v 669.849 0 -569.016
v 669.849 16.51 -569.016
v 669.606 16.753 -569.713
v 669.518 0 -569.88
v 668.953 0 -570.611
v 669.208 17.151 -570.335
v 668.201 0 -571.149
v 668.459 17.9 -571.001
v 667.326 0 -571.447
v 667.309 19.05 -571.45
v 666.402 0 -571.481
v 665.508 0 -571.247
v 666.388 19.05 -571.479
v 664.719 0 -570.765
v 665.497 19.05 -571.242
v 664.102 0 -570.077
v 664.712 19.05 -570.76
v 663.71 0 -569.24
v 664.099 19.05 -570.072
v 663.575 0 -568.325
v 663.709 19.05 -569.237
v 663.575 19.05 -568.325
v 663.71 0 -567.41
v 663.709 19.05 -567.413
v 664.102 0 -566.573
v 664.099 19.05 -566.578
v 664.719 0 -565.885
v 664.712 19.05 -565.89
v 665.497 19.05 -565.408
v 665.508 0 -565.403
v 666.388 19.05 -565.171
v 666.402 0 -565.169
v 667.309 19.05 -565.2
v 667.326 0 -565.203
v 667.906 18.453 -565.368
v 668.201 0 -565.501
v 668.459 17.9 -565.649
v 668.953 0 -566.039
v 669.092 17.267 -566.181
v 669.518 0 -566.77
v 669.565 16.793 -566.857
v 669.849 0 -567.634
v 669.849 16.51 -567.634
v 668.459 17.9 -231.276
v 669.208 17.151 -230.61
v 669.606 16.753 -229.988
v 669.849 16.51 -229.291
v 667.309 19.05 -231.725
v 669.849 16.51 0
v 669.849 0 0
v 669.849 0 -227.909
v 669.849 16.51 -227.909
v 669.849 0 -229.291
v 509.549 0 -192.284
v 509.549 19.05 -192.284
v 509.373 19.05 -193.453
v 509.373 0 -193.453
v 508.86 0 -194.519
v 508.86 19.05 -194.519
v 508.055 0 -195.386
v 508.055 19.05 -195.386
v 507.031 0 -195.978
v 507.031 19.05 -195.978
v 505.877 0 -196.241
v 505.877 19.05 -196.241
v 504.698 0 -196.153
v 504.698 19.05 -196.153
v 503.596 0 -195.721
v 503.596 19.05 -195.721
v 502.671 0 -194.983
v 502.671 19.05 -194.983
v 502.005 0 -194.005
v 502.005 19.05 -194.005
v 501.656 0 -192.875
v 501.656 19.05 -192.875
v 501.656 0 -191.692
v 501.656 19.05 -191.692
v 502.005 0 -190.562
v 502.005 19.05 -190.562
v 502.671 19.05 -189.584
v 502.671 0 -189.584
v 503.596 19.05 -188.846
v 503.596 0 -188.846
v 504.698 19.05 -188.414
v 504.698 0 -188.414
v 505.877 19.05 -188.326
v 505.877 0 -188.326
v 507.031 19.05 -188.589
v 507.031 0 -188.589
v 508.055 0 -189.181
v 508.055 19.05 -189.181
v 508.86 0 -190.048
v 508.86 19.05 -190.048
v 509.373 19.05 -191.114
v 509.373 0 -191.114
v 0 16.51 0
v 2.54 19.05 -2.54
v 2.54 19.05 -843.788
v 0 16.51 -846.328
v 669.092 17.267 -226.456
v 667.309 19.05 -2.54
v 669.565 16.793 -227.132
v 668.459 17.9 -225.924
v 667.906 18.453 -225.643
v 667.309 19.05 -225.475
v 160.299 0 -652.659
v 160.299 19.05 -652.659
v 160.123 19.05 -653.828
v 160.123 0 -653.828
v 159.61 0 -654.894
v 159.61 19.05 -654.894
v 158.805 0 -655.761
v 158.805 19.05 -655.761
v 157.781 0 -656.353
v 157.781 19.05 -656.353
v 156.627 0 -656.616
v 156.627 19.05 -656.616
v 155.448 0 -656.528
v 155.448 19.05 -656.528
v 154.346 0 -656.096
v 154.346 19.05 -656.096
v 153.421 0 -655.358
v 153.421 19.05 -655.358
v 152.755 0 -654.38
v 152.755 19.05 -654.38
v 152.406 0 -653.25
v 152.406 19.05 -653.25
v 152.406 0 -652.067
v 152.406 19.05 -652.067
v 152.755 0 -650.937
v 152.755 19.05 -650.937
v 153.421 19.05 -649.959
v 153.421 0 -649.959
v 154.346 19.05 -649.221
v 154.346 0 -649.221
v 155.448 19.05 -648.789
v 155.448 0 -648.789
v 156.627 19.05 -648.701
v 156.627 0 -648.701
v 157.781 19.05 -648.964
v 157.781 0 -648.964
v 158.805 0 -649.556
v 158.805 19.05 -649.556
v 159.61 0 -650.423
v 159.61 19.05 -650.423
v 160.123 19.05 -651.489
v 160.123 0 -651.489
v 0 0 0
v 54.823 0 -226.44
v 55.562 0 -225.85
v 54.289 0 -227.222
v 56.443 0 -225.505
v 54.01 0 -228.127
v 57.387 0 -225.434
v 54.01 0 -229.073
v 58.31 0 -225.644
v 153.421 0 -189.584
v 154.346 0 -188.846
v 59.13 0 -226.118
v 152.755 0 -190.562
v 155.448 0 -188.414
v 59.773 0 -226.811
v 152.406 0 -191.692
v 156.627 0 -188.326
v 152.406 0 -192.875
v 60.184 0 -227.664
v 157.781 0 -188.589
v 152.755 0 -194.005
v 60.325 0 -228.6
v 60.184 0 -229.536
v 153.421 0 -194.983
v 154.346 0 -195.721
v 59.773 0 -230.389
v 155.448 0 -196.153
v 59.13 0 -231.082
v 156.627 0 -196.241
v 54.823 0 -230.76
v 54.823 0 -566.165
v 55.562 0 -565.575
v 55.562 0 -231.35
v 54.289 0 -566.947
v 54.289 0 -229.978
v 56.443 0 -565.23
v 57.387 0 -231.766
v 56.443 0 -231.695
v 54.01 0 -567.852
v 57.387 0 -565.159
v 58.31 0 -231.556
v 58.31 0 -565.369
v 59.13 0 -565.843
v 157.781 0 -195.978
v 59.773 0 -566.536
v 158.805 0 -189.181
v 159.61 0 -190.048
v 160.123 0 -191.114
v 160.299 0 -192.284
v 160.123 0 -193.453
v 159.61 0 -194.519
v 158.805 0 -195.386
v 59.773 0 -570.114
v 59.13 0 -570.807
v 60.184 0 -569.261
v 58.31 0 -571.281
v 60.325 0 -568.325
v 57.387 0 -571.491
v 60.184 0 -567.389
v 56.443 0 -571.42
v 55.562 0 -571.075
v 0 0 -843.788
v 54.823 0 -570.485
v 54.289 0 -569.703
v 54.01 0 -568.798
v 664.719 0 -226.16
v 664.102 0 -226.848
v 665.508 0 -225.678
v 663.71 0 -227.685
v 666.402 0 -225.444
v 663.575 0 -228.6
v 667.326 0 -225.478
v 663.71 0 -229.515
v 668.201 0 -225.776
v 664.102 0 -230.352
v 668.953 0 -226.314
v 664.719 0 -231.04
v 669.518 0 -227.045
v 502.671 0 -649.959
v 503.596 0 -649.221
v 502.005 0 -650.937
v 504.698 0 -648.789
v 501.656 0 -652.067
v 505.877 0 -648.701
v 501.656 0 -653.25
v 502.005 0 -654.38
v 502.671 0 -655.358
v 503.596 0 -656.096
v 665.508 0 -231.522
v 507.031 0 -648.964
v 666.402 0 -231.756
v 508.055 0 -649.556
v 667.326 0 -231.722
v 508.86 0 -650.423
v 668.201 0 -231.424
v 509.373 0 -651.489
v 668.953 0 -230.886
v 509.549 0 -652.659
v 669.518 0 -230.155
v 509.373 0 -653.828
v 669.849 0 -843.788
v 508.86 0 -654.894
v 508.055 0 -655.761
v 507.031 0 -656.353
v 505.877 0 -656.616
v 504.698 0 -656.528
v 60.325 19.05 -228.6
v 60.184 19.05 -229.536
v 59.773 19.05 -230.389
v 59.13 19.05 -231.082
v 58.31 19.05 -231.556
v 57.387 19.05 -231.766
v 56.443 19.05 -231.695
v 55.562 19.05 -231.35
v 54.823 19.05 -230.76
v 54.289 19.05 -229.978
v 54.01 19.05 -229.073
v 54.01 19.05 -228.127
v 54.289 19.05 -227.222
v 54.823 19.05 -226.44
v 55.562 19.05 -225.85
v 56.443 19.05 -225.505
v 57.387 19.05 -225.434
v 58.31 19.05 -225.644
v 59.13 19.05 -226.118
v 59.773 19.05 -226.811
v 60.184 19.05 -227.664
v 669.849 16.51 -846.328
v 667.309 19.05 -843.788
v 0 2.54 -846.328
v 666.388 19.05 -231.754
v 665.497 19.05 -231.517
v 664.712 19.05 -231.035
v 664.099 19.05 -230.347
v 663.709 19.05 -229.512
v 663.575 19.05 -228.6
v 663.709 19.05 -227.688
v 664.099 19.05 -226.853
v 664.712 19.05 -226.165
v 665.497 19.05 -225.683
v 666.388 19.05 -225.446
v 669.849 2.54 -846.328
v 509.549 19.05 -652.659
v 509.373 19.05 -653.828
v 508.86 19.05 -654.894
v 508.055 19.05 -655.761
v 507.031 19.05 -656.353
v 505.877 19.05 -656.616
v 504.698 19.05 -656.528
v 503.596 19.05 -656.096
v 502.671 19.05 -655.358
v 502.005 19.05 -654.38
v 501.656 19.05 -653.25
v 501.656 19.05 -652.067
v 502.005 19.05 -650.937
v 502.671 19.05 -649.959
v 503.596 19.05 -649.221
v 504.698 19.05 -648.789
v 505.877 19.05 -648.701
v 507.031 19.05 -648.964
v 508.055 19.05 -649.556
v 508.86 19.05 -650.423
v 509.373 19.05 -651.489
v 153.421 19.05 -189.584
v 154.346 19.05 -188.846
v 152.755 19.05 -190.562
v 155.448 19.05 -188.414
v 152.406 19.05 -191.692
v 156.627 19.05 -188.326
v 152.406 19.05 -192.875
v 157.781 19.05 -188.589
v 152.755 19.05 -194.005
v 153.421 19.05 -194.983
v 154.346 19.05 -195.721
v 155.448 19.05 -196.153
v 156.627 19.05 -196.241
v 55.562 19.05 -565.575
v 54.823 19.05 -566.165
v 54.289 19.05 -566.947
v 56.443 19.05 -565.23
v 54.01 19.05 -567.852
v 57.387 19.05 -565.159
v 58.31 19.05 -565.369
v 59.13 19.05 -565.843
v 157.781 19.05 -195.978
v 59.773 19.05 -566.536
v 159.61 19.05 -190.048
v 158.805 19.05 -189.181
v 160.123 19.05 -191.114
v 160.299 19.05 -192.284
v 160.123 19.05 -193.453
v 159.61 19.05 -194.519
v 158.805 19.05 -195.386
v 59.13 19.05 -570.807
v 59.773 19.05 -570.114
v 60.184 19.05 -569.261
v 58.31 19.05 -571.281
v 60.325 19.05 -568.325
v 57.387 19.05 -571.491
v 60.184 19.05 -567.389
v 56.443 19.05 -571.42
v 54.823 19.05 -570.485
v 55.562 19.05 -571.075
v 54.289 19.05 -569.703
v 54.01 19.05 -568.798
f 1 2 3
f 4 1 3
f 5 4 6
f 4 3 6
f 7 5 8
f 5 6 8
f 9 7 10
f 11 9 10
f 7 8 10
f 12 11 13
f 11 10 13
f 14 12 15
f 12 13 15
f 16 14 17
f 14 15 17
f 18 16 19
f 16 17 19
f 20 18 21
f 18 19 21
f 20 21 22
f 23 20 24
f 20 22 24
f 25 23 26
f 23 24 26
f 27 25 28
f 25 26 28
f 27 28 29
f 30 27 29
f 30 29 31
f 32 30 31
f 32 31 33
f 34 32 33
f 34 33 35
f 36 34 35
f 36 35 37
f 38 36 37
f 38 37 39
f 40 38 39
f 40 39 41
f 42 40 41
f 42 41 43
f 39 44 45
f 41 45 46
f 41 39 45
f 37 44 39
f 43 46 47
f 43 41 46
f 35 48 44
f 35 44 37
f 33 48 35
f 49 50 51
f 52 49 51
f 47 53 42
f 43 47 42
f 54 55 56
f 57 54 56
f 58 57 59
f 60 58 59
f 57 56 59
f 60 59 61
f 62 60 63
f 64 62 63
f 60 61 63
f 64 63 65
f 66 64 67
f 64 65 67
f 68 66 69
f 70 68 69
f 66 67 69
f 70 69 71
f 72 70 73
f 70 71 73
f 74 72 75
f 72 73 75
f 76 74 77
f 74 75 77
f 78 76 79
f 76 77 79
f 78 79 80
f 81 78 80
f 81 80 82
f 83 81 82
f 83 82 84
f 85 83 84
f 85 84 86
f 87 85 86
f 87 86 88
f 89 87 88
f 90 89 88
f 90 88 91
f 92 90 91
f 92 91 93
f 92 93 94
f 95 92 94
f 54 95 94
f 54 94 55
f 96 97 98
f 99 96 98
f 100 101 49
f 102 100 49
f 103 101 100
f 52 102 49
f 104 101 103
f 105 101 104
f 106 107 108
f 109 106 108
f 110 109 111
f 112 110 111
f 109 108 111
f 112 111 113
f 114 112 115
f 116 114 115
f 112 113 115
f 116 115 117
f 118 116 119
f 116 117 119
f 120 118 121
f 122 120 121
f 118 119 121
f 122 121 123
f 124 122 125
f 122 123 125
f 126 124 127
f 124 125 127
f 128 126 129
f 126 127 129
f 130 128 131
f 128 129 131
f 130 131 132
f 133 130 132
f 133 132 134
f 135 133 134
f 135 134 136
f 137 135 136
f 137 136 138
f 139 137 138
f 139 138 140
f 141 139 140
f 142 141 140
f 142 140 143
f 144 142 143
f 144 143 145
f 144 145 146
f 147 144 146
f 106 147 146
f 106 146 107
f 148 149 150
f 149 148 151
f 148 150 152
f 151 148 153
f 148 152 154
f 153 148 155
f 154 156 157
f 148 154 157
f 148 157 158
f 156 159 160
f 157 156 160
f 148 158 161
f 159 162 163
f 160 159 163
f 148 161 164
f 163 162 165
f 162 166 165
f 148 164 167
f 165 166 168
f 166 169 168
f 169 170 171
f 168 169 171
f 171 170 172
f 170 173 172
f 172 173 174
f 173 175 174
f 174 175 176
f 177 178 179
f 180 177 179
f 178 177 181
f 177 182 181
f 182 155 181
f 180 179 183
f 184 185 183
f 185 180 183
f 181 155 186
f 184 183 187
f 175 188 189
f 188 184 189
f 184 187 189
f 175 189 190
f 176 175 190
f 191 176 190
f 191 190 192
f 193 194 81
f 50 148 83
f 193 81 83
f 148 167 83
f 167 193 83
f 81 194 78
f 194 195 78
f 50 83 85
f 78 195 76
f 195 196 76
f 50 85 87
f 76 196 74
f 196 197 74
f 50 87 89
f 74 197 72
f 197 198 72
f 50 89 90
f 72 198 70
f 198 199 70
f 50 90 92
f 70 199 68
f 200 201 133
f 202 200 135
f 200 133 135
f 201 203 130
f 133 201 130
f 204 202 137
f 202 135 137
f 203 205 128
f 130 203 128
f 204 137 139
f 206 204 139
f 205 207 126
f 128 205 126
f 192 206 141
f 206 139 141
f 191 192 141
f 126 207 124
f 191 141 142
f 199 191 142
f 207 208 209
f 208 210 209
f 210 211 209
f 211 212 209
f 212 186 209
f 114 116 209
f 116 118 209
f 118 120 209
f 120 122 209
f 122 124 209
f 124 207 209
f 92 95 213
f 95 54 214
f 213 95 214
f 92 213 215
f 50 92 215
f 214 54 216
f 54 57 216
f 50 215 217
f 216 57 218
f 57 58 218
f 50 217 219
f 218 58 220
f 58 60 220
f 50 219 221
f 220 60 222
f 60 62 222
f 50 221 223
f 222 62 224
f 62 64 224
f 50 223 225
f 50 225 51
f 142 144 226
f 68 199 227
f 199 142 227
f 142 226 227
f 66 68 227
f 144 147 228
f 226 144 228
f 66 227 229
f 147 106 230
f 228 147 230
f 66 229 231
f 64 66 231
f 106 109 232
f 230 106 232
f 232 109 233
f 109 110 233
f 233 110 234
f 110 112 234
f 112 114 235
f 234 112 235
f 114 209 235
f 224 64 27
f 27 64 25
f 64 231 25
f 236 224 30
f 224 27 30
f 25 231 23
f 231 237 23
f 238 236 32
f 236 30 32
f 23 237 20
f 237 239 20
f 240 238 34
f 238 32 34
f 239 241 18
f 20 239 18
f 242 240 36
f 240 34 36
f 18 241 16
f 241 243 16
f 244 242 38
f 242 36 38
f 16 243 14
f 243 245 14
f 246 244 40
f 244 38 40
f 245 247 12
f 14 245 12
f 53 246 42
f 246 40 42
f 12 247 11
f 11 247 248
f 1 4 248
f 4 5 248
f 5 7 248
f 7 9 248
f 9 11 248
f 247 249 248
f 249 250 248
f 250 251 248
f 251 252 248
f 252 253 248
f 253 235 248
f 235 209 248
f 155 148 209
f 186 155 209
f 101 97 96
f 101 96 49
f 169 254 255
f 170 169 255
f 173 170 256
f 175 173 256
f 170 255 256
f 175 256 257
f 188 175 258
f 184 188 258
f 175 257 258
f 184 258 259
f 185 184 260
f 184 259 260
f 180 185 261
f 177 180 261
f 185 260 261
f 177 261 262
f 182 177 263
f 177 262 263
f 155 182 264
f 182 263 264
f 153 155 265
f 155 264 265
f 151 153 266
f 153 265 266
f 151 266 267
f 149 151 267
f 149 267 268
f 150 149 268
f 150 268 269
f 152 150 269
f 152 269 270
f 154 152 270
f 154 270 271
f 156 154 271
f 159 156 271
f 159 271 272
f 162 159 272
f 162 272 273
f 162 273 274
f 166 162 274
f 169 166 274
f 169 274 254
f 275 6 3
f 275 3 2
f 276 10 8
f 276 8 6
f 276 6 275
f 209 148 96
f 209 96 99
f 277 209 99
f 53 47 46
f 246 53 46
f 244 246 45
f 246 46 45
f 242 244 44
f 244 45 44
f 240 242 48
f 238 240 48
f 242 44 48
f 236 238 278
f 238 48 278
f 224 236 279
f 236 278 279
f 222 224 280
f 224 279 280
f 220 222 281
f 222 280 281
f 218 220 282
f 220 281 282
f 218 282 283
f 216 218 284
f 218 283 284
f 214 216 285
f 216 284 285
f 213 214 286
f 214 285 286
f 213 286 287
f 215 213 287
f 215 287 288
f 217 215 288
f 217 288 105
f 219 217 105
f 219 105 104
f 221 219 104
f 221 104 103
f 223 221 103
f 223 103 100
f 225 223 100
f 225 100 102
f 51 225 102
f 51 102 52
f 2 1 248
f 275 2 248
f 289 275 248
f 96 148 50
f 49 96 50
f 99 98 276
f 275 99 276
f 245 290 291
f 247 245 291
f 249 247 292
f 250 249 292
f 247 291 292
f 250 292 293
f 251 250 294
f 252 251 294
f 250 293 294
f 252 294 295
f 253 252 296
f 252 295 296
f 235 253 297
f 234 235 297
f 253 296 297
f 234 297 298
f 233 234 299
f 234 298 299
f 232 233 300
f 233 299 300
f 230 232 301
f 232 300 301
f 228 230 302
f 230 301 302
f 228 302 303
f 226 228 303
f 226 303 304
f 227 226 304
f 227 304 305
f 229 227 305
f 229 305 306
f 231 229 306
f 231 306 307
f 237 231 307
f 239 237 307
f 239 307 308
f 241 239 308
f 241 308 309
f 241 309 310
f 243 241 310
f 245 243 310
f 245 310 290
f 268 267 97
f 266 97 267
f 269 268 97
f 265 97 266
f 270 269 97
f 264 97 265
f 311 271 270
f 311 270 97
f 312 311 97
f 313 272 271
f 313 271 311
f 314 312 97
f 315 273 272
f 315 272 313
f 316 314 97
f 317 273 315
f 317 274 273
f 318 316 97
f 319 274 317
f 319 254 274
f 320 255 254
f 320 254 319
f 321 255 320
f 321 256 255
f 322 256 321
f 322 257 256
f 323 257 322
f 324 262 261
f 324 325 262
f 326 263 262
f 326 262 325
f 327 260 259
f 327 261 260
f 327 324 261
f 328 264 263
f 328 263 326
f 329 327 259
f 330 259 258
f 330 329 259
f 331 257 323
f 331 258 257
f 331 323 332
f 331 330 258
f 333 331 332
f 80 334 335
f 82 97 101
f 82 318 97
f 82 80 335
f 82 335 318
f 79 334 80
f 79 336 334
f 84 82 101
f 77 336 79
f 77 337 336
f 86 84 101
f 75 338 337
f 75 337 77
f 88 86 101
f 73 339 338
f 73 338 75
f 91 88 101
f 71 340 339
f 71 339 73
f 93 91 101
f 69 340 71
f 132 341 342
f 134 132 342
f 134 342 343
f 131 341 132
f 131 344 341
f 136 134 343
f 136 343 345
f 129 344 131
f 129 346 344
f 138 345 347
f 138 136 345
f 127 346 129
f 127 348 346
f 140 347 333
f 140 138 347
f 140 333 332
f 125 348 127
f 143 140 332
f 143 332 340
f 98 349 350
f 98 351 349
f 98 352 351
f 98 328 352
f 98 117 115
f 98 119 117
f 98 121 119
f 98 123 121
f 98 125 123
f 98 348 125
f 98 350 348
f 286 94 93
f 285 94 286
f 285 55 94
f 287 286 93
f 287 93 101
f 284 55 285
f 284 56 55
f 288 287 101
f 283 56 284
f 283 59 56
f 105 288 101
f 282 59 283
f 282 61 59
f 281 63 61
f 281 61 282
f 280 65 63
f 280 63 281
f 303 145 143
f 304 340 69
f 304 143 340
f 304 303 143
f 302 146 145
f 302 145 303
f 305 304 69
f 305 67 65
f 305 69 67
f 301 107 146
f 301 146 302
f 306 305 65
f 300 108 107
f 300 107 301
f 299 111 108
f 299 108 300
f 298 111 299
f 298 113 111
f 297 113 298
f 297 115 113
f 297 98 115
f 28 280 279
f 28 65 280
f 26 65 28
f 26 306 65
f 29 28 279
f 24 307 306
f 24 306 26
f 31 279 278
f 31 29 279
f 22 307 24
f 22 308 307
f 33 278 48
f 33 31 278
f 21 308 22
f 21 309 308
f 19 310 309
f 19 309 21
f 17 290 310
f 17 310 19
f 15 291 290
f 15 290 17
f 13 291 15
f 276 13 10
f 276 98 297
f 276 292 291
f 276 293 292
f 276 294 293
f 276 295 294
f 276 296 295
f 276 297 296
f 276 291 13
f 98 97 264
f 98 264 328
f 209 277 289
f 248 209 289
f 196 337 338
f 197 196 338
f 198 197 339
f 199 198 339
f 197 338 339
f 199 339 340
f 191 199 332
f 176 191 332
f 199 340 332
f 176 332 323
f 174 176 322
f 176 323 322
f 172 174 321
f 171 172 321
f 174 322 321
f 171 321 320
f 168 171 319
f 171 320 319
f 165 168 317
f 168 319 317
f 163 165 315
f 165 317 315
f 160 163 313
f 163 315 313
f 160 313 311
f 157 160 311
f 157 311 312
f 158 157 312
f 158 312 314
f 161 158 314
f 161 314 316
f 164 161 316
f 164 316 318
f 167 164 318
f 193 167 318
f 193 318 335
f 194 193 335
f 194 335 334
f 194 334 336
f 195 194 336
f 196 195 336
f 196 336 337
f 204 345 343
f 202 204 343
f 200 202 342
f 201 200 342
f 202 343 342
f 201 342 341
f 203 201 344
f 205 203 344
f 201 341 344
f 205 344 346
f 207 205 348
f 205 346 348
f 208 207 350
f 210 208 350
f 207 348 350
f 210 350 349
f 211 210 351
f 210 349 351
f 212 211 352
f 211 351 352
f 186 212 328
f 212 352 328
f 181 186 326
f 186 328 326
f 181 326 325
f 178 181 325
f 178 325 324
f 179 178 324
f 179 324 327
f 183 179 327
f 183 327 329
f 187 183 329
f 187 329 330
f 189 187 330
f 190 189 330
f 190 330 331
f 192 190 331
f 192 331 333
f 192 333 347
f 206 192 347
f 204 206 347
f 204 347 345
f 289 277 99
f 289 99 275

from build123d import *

# Parameters (mm, degrees)
SKETCH1_W           = 669.8488
SKETCH1_H           = 846.328
BOSS_EXTRUDE1_DEPTH = 19.05
CHAMFER1_SIZE       = 2.54
CHAMFER2_SIZE       = 2.54
SKETCH3_R           = 3.96875
CUT_EXTRUDE4_DEPTH  = 20.05
SKETCH2_R           = 3.175
CUT_EXTRUDE3_DEPTH  = 20.05


with BuildPart() as part:
    # Sketch1 → Boss-Extrude1 (new body)
    with BuildSketch(Plane(origin=(0, 0, 0), x_dir=(1, 0, 0), z_dir=(0, 1, 0))):
        with Locations((334.9244, 423.164)):
            Rectangle(SKETCH1_W, SKETCH1_H)
    extrude(amount=BOSS_EXTRUDE1_DEPTH)

    # Chamfer1
    chamfer1_edges = [part.edges().sort_by_distance(p)[0] for p in [
        (669.8488, 19.05, -423.164),
        (334.9244, 19.05, -846.328),
        (0, 19.05, -423.164),
        (334.9244, 19.05, 0),
    ]]
    chamfer(chamfer1_edges, length=CHAMFER1_SIZE)

    # Chamfer2
    chamfer2_edges = [part.edges().sort_by_distance(p)[0] for p in [
        (334.9244, 0, -846.328),
    ]]
    chamfer(chamfer2_edges, length=CHAMFER2_SIZE)

    # Sketch3 → Cut-Extrude4 (cut, through all)
    with BuildSketch(Plane(origin=(0, 19.05, 0), x_dir=(1, 0, 0), z_dir=(0, 1, 0))):
        with Locations((505.58065, 192.283509599)):
            Circle(SKETCH3_R)
        with Locations((156.33065, 192.283509599)):
            Circle(SKETCH3_R)
        with Locations((156.33065, 652.658509599)):
            Circle(SKETCH3_R)
        with Locations((505.58065, 652.658509599)):
            Circle(SKETCH3_R)
    extrude(amount=-CUT_EXTRUDE4_DEPTH, mode=Mode.SUBTRACT)

    # Sketch2 → Cut-Extrude3 (cut, through all)
    with BuildSketch(Plane(origin=(0, 19.05, 0), x_dir=(1, 0, 0), z_dir=(0, 1, 0))):
        with Locations((57.15, 568.325)):
            Circle(SKETCH2_R)
        with Locations((57.15, 228.6)):
            Circle(SKETCH2_R)
        with Locations((666.75, 568.325)):
            Circle(SKETCH2_R)
        with Locations((666.75, 228.6)):
            Circle(SKETCH2_R)
    extrude(amount=-CUT_EXTRUDE3_DEPTH, mode=Mode.SUBTRACT)


solid = part.part
